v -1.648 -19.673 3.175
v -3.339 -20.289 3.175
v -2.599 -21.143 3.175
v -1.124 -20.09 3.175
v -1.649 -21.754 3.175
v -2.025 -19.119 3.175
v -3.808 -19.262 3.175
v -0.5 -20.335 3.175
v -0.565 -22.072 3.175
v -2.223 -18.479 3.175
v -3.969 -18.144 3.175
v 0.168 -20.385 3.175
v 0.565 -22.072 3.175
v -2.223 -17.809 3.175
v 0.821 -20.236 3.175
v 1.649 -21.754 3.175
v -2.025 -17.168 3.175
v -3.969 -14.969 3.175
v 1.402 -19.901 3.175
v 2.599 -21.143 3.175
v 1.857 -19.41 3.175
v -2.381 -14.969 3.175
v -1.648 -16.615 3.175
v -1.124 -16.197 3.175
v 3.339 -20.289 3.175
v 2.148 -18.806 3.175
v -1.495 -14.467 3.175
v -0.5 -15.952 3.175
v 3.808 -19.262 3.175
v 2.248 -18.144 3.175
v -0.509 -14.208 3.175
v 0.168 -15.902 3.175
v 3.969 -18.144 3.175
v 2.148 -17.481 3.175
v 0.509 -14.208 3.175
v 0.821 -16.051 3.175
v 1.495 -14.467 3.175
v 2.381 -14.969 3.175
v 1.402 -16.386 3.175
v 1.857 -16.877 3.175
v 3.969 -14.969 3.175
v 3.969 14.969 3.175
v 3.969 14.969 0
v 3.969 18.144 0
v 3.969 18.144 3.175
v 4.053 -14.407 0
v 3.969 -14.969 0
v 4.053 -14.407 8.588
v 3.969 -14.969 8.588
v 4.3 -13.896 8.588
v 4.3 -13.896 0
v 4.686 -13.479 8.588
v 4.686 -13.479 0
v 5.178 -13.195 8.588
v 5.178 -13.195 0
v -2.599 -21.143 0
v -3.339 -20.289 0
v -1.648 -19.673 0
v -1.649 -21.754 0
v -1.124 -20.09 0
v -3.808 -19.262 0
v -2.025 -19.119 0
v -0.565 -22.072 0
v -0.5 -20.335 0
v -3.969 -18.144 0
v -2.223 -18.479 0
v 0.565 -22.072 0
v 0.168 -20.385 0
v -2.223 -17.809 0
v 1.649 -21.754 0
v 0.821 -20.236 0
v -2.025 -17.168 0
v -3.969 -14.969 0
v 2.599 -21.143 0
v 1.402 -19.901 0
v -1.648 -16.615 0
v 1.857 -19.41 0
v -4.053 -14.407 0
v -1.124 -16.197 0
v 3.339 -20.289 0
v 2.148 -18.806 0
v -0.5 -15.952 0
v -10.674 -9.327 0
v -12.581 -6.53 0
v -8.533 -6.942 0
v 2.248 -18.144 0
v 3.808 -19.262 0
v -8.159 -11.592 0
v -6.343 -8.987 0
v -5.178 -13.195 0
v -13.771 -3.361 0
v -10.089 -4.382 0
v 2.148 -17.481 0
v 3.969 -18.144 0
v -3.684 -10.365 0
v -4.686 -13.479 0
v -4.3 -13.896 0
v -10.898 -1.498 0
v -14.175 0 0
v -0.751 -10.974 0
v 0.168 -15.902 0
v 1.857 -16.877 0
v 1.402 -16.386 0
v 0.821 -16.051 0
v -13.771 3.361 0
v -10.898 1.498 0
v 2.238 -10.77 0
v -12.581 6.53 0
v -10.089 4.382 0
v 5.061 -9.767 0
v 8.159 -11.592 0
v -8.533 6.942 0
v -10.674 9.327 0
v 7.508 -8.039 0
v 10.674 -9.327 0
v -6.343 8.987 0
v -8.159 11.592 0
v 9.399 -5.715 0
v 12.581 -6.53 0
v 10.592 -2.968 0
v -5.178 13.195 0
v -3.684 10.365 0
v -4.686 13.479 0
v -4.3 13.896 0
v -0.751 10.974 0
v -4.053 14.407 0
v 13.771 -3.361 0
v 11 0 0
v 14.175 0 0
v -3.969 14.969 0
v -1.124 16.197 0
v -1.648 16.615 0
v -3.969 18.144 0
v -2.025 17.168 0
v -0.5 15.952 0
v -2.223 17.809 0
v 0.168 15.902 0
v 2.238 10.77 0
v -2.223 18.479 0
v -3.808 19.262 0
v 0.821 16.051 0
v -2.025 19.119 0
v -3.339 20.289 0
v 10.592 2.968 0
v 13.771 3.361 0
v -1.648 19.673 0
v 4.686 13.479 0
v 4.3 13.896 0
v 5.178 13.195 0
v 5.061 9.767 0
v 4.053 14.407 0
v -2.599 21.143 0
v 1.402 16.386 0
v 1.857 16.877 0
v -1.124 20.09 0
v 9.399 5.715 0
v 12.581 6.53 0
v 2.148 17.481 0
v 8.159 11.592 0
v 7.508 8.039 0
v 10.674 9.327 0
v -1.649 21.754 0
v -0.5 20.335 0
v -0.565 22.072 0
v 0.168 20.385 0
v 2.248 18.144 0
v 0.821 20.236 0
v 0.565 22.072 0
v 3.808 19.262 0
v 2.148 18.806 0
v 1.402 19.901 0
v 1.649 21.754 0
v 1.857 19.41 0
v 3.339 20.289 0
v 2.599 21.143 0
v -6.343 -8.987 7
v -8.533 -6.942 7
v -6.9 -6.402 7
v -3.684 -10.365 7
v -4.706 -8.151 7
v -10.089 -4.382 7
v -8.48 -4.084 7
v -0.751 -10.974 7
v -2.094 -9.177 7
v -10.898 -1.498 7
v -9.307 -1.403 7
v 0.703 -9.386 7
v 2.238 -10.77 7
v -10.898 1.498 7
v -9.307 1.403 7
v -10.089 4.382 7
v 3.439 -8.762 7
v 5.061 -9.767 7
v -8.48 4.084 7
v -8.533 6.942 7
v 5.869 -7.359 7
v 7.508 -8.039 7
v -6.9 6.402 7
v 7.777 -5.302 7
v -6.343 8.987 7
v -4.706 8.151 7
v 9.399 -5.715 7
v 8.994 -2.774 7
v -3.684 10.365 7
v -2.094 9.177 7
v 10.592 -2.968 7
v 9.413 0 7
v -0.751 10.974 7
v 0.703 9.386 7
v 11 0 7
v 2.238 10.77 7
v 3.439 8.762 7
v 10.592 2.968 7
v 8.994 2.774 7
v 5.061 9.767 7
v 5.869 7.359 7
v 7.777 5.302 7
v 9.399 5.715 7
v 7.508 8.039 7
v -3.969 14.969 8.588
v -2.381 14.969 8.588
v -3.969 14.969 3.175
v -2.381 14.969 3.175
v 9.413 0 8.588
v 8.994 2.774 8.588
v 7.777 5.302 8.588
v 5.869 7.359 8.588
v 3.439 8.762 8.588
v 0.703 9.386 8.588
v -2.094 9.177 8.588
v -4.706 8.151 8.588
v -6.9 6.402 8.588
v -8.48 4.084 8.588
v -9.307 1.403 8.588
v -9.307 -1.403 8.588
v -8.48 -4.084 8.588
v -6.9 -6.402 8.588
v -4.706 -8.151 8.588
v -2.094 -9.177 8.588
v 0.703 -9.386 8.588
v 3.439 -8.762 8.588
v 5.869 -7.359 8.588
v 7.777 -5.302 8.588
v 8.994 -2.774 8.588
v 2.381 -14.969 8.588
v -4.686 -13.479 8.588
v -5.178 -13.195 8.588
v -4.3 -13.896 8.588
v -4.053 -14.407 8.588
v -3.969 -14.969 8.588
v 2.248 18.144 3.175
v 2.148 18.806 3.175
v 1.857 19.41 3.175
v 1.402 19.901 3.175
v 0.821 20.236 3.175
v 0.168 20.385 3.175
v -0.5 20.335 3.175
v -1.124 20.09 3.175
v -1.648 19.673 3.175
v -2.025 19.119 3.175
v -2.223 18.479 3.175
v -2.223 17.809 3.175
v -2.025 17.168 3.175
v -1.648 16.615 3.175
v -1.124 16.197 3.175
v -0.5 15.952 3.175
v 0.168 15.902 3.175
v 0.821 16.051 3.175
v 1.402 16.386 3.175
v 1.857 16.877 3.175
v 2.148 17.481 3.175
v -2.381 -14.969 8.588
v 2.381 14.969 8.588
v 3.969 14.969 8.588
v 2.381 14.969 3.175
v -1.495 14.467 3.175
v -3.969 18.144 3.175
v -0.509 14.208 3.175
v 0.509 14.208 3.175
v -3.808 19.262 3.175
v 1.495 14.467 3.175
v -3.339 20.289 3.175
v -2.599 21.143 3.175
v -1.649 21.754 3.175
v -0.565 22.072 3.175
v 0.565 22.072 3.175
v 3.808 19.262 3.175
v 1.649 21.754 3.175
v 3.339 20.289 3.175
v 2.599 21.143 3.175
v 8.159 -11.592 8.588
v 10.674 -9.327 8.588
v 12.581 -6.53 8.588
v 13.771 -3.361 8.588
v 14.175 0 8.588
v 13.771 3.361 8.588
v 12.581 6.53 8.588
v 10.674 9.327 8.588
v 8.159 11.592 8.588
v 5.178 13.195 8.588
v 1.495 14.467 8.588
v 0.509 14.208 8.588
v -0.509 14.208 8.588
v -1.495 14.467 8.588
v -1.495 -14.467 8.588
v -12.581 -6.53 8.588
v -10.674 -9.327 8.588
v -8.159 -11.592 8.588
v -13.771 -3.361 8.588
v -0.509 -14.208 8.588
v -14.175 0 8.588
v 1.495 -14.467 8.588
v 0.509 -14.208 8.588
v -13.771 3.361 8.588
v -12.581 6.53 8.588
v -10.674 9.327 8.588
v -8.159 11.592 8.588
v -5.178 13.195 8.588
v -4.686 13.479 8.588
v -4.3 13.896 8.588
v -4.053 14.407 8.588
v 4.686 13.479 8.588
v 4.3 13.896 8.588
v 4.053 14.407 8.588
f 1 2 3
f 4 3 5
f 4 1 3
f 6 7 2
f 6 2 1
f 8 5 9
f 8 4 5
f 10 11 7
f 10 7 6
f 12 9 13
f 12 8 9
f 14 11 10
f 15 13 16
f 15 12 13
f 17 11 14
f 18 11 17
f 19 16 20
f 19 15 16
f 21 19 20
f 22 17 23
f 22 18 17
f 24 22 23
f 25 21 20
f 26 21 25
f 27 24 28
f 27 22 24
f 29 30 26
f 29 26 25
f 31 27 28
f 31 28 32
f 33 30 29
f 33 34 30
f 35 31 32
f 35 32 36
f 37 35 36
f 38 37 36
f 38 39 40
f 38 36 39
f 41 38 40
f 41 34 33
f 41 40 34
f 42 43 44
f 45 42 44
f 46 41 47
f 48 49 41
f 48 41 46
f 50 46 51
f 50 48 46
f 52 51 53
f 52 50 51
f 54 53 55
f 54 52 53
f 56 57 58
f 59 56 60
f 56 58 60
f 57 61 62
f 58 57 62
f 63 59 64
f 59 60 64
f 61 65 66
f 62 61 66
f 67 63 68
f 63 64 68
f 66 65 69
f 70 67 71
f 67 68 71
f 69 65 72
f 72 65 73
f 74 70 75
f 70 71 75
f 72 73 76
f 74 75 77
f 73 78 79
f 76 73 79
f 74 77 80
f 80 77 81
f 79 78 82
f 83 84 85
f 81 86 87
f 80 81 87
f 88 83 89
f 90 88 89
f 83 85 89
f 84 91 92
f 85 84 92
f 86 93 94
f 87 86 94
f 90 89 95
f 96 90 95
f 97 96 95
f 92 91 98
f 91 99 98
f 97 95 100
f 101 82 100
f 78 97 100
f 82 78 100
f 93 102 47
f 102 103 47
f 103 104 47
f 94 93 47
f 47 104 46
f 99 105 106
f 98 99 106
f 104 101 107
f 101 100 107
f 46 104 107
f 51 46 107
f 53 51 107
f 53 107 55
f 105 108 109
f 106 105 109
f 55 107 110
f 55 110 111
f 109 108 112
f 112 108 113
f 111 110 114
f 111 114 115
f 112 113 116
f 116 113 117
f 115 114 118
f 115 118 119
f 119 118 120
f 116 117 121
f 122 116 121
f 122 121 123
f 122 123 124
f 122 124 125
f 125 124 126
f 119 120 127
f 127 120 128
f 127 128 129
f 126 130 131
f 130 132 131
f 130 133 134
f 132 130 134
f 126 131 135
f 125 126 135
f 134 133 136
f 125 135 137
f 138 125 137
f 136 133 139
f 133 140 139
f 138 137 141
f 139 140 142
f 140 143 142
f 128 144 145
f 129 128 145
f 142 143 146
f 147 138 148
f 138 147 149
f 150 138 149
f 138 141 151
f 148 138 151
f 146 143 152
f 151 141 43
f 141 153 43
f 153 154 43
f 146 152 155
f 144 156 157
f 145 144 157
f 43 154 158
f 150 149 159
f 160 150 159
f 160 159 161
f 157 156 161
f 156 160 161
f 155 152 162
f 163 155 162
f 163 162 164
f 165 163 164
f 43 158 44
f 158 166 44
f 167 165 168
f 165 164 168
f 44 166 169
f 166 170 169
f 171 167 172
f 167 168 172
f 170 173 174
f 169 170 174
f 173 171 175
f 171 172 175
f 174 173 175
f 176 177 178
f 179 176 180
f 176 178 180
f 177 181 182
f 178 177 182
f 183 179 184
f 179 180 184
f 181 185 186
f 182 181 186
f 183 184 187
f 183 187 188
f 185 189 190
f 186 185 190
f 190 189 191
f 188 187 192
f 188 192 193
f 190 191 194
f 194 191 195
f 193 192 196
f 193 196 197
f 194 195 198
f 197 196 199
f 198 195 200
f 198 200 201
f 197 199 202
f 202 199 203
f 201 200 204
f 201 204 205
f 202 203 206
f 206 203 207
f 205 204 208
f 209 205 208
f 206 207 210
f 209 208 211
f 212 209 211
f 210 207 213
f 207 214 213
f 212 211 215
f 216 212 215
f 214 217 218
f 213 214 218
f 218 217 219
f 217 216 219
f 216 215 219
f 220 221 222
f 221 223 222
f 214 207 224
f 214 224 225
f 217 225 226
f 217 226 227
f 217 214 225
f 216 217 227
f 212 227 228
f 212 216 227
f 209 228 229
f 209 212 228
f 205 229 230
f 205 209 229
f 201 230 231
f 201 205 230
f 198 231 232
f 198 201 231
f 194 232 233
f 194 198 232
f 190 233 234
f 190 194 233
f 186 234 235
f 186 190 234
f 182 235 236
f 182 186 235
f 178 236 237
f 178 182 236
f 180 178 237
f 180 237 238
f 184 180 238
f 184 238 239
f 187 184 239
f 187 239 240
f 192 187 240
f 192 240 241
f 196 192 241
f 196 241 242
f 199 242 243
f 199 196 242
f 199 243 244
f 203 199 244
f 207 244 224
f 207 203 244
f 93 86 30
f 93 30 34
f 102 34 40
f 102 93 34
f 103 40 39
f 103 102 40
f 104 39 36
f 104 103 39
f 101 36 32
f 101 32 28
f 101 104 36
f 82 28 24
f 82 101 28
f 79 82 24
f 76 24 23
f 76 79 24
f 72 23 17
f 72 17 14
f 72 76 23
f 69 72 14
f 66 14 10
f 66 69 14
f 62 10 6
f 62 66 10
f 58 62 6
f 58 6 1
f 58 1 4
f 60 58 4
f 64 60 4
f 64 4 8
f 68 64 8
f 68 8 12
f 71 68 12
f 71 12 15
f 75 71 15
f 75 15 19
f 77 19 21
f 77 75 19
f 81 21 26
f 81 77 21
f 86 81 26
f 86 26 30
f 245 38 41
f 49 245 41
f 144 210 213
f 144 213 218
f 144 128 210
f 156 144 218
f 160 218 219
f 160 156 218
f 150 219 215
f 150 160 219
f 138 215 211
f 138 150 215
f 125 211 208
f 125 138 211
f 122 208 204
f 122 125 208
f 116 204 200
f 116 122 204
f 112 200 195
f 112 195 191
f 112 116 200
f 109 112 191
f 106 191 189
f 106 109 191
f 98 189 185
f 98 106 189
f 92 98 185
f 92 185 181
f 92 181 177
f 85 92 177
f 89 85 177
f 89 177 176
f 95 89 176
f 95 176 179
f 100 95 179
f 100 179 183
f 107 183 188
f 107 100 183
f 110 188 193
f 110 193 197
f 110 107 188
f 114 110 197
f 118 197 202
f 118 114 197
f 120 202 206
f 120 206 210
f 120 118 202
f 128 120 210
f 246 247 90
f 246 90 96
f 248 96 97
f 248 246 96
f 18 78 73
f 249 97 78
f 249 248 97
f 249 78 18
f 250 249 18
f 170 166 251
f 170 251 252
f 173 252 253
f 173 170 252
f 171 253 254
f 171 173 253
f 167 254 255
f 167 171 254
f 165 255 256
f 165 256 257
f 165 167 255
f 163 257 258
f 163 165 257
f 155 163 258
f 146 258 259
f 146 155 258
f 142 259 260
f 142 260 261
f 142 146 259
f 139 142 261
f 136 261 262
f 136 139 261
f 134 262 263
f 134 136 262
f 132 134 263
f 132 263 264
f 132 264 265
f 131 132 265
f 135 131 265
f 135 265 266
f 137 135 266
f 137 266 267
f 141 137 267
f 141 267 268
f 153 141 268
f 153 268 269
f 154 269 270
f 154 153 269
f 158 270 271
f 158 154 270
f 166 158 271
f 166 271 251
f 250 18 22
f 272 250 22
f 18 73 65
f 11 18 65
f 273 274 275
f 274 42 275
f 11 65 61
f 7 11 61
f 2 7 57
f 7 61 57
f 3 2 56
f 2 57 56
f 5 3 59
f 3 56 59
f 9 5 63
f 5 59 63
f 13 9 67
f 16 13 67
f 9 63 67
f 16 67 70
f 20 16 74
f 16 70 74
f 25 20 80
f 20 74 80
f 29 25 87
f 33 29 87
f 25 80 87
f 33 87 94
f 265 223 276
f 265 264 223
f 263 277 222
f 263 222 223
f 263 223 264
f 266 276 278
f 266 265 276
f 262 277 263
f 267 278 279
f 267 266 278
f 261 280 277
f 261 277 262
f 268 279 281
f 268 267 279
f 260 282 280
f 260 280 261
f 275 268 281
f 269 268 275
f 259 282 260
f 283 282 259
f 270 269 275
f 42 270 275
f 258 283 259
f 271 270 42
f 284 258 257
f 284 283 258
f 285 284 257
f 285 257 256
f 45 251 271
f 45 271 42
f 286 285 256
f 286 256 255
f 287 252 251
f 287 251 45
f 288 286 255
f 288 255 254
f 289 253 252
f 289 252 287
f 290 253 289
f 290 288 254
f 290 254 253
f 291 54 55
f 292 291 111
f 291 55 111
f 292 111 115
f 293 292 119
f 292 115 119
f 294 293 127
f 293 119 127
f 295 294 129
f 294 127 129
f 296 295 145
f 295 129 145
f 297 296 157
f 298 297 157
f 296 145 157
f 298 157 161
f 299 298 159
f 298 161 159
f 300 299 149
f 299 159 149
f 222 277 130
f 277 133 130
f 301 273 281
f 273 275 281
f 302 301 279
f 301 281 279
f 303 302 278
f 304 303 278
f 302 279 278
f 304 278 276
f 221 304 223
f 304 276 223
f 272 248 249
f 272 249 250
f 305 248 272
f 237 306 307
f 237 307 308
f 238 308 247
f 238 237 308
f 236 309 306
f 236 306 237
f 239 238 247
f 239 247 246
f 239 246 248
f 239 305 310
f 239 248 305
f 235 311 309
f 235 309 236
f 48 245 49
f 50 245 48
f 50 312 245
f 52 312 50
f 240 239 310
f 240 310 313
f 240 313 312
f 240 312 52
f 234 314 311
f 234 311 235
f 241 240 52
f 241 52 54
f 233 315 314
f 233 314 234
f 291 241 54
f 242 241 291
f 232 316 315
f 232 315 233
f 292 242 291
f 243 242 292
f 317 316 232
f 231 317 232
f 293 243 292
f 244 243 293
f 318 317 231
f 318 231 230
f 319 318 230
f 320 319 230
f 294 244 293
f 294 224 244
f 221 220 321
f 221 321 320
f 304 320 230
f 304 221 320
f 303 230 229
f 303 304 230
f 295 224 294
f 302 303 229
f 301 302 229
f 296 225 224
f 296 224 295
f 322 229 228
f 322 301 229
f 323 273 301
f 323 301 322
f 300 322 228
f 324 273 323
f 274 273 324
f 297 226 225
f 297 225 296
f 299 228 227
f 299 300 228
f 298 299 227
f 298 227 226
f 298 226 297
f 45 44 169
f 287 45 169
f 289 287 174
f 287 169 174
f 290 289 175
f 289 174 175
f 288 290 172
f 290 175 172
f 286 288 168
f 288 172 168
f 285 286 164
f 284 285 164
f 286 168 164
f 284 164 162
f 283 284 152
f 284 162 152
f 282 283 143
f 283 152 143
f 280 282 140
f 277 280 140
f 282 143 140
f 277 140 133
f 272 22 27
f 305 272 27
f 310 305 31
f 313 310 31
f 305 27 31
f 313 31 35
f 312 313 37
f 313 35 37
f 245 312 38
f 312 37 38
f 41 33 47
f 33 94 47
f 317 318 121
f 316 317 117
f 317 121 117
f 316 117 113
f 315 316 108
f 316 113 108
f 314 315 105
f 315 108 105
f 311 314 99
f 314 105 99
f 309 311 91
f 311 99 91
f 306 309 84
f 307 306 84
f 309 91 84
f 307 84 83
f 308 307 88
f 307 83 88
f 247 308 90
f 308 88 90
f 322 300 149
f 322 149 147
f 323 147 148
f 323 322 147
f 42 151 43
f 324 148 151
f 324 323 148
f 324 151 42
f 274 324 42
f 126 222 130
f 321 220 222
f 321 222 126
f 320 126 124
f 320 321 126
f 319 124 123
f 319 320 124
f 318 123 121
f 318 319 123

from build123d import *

# Parameters (mm, degrees)
F0_R     = 2.2479
F0_R_2   = 11
F1_DEPTH = 3.175
F2_R     = 11
F3_DEPTH = 3.8250114
F4_R     = 11
F4_R_2   = 9.4125034
F5_DEPTH = 1.5875
F7_DEPTH = 8.5875114


with BuildPart() as f1:
    # F0 (on Top) → F1 (new body)
    with BuildSketch(Plane.XY):
        with BuildLine():
            Line((3.96875, -18.14374959), (3.96875, -13.6080724871))
            ThreePointArc((3.96875, -13.6080724871), (14.17499959, 0), (3.96875, 13.6080724871))
            Line((3.96875, 13.6080724871), (3.96875, 18.14374959))
            ThreePointArc((3.96875, 18.14374959), (0, 22.11249959), (-3.96875, 18.14374959))
            Line((-3.96875, 18.14374959), (-3.96875, 13.6080724871))
            ThreePointArc((-3.96875, 13.6080724871), (-14.17499959, 0), (-3.96875, -13.6080724871))
            Line((-3.96875, -13.6080724871), (-3.96875, -18.14374959))
            ThreePointArc((-3.96875, -18.14374959), (0, -22.11249959), (3.96875, -18.14374959))
        make_face()
        with Locations((0, -18.14374959)):
            Circle(F0_R, mode=Mode.SUBTRACT)
        Circle(F0_R_2, mode=Mode.SUBTRACT)
        with Locations((0, 18.14374959)):
            Circle(F0_R, mode=Mode.SUBTRACT)
    extrude(amount=F1_DEPTH)

    # F2 (on face) → F3 (join)
    with BuildSketch(Plane.XY.offset(3.175)):
        with BuildLine():
            ThreePointArc((2.38125, 14.96874959), (0, 14.17499959), (-2.38125, 14.96874959))
            Line((-2.38125, 14.96874959), (-3.96875, 14.96874959))
            Line((-3.96875, 14.96874959), (-3.96875, 13.6080724871))
            ThreePointArc((-3.96875, 13.6080724871), (-14.17499959, 0), (-3.96875, -13.6080724871))
            Line((-3.96875, -13.6080724871), (-3.96875, -14.96874959))
            Line((-3.96875, -14.96874959), (-2.38125, -14.96874959))
            ThreePointArc((-2.38125, -14.96874959), (0, -14.17499959), (2.38125, -14.96874959))
            Line((2.38125, -14.96874959), (3.96875, -14.96874959))
            Line((3.96875, -14.96874959), (3.96875, -13.6080724871))
            ThreePointArc((3.96875, -13.6080724871), (14.17499959, 0), (3.96875, 13.6080724871))
            Line((3.96875, 13.6080724871), (3.96875, 14.96874959))
            Line((3.96875, 14.96874959), (2.38125, 14.96874959))
        make_face()
        Circle(F2_R, mode=Mode.SUBTRACT)
    extrude(amount=F3_DEPTH)

    # F4 (on face) → F5 (join)
    with BuildSketch(Plane.XY.offset(7.0000114)):
        with BuildLine():
            ThreePointArc((3.96875, -13.6080724871), (14.17499959, 0), (3.96875, 13.6080724871))
            Line((3.96875, 13.6080724871), (3.96875, 14.96874959))
            Line((3.96875, 14.96874959), (2.38125, 14.96874959))
            ThreePointArc((2.38125, 14.96874959), (0, 14.17499959), (-2.38125, 14.96874959))
            Line((-2.38125, 14.96874959), (-3.96875, 14.96874959))
            Line((-3.96875, 14.96874959), (-3.96875, 13.6080724871))
            ThreePointArc((-3.96875, 13.6080724871), (-14.17499959, 0), (-3.96875, -13.6080724871))
            Line((-3.96875, -13.6080724871), (-3.96875, -14.96874959))
            Line((-3.96875, -14.96874959), (-2.38125, -14.96874959))
            ThreePointArc((-2.38125, -14.96874959), (0, -14.17499959), (2.38125, -14.96874959))
            Line((2.38125, -14.96874959), (3.96875, -14.96874959))
            Line((3.96875, -14.96874959), (3.96875, -13.6080724871))
        make_face()
        Circle(F4_R, mode=Mode.SUBTRACT)
        Circle(F4_R)
        Circle(F4_R_2, mode=Mode.SUBTRACT)
    extrude(amount=F5_DEPTH)

    # F6 (on face) → F7 (join, through all)
    with BuildSketch(Plane.XY.offset(8.5875114)):
        with BuildLine():
            ThreePointArc((-3.96875, 14.96874959), (-4.2997839234, 13.8956272964), (-5.1778315745, 13.1954792851))
            ThreePointArc((-5.1778315745, 13.1954792851), (-4.57794134, 13.4154040738), (-3.96875, 13.6080724871))
            Line((-3.96875, 13.6080724871), (-3.96875, 14.96874959))
        make_face()
        with BuildLine():
            ThreePointArc((5.1778315745, 13.1954792851), (4.2997839234, 13.8956272964), (3.96875, 14.96874959))
            Line((3.96875, 14.96874959), (3.96875, 13.6080724871))
            ThreePointArc((3.96875, 13.6080724871), (4.57794134, 13.4154040738), (5.1778315745, 13.1954792851))
        make_face()
        with BuildLine():
            ThreePointArc((-5.1778315745, -13.1954792851), (-4.2997839234, -13.8956272964), (-3.96875, -14.96874959))
            Line((-3.96875, -14.96874959), (-3.96875, -13.6080724871))
            ThreePointArc((-3.96875, -13.6080724871), (-4.57794134, -13.4154040738), (-5.1778315745, -13.1954792851))
        make_face()
        with BuildLine():
            ThreePointArc((3.96875, -14.96874959), (4.2997839234, -13.8956272964), (5.1778315745, -13.1954792851))
            ThreePointArc((5.1778315745, -13.1954792851), (4.57794134, -13.4154040738), (3.96875, -13.6080724871))
            Line((3.96875, -13.6080724871), (3.96875, -14.96874959))
        make_face()
    extrude(amount=-F7_DEPTH)


solid = f1.part
